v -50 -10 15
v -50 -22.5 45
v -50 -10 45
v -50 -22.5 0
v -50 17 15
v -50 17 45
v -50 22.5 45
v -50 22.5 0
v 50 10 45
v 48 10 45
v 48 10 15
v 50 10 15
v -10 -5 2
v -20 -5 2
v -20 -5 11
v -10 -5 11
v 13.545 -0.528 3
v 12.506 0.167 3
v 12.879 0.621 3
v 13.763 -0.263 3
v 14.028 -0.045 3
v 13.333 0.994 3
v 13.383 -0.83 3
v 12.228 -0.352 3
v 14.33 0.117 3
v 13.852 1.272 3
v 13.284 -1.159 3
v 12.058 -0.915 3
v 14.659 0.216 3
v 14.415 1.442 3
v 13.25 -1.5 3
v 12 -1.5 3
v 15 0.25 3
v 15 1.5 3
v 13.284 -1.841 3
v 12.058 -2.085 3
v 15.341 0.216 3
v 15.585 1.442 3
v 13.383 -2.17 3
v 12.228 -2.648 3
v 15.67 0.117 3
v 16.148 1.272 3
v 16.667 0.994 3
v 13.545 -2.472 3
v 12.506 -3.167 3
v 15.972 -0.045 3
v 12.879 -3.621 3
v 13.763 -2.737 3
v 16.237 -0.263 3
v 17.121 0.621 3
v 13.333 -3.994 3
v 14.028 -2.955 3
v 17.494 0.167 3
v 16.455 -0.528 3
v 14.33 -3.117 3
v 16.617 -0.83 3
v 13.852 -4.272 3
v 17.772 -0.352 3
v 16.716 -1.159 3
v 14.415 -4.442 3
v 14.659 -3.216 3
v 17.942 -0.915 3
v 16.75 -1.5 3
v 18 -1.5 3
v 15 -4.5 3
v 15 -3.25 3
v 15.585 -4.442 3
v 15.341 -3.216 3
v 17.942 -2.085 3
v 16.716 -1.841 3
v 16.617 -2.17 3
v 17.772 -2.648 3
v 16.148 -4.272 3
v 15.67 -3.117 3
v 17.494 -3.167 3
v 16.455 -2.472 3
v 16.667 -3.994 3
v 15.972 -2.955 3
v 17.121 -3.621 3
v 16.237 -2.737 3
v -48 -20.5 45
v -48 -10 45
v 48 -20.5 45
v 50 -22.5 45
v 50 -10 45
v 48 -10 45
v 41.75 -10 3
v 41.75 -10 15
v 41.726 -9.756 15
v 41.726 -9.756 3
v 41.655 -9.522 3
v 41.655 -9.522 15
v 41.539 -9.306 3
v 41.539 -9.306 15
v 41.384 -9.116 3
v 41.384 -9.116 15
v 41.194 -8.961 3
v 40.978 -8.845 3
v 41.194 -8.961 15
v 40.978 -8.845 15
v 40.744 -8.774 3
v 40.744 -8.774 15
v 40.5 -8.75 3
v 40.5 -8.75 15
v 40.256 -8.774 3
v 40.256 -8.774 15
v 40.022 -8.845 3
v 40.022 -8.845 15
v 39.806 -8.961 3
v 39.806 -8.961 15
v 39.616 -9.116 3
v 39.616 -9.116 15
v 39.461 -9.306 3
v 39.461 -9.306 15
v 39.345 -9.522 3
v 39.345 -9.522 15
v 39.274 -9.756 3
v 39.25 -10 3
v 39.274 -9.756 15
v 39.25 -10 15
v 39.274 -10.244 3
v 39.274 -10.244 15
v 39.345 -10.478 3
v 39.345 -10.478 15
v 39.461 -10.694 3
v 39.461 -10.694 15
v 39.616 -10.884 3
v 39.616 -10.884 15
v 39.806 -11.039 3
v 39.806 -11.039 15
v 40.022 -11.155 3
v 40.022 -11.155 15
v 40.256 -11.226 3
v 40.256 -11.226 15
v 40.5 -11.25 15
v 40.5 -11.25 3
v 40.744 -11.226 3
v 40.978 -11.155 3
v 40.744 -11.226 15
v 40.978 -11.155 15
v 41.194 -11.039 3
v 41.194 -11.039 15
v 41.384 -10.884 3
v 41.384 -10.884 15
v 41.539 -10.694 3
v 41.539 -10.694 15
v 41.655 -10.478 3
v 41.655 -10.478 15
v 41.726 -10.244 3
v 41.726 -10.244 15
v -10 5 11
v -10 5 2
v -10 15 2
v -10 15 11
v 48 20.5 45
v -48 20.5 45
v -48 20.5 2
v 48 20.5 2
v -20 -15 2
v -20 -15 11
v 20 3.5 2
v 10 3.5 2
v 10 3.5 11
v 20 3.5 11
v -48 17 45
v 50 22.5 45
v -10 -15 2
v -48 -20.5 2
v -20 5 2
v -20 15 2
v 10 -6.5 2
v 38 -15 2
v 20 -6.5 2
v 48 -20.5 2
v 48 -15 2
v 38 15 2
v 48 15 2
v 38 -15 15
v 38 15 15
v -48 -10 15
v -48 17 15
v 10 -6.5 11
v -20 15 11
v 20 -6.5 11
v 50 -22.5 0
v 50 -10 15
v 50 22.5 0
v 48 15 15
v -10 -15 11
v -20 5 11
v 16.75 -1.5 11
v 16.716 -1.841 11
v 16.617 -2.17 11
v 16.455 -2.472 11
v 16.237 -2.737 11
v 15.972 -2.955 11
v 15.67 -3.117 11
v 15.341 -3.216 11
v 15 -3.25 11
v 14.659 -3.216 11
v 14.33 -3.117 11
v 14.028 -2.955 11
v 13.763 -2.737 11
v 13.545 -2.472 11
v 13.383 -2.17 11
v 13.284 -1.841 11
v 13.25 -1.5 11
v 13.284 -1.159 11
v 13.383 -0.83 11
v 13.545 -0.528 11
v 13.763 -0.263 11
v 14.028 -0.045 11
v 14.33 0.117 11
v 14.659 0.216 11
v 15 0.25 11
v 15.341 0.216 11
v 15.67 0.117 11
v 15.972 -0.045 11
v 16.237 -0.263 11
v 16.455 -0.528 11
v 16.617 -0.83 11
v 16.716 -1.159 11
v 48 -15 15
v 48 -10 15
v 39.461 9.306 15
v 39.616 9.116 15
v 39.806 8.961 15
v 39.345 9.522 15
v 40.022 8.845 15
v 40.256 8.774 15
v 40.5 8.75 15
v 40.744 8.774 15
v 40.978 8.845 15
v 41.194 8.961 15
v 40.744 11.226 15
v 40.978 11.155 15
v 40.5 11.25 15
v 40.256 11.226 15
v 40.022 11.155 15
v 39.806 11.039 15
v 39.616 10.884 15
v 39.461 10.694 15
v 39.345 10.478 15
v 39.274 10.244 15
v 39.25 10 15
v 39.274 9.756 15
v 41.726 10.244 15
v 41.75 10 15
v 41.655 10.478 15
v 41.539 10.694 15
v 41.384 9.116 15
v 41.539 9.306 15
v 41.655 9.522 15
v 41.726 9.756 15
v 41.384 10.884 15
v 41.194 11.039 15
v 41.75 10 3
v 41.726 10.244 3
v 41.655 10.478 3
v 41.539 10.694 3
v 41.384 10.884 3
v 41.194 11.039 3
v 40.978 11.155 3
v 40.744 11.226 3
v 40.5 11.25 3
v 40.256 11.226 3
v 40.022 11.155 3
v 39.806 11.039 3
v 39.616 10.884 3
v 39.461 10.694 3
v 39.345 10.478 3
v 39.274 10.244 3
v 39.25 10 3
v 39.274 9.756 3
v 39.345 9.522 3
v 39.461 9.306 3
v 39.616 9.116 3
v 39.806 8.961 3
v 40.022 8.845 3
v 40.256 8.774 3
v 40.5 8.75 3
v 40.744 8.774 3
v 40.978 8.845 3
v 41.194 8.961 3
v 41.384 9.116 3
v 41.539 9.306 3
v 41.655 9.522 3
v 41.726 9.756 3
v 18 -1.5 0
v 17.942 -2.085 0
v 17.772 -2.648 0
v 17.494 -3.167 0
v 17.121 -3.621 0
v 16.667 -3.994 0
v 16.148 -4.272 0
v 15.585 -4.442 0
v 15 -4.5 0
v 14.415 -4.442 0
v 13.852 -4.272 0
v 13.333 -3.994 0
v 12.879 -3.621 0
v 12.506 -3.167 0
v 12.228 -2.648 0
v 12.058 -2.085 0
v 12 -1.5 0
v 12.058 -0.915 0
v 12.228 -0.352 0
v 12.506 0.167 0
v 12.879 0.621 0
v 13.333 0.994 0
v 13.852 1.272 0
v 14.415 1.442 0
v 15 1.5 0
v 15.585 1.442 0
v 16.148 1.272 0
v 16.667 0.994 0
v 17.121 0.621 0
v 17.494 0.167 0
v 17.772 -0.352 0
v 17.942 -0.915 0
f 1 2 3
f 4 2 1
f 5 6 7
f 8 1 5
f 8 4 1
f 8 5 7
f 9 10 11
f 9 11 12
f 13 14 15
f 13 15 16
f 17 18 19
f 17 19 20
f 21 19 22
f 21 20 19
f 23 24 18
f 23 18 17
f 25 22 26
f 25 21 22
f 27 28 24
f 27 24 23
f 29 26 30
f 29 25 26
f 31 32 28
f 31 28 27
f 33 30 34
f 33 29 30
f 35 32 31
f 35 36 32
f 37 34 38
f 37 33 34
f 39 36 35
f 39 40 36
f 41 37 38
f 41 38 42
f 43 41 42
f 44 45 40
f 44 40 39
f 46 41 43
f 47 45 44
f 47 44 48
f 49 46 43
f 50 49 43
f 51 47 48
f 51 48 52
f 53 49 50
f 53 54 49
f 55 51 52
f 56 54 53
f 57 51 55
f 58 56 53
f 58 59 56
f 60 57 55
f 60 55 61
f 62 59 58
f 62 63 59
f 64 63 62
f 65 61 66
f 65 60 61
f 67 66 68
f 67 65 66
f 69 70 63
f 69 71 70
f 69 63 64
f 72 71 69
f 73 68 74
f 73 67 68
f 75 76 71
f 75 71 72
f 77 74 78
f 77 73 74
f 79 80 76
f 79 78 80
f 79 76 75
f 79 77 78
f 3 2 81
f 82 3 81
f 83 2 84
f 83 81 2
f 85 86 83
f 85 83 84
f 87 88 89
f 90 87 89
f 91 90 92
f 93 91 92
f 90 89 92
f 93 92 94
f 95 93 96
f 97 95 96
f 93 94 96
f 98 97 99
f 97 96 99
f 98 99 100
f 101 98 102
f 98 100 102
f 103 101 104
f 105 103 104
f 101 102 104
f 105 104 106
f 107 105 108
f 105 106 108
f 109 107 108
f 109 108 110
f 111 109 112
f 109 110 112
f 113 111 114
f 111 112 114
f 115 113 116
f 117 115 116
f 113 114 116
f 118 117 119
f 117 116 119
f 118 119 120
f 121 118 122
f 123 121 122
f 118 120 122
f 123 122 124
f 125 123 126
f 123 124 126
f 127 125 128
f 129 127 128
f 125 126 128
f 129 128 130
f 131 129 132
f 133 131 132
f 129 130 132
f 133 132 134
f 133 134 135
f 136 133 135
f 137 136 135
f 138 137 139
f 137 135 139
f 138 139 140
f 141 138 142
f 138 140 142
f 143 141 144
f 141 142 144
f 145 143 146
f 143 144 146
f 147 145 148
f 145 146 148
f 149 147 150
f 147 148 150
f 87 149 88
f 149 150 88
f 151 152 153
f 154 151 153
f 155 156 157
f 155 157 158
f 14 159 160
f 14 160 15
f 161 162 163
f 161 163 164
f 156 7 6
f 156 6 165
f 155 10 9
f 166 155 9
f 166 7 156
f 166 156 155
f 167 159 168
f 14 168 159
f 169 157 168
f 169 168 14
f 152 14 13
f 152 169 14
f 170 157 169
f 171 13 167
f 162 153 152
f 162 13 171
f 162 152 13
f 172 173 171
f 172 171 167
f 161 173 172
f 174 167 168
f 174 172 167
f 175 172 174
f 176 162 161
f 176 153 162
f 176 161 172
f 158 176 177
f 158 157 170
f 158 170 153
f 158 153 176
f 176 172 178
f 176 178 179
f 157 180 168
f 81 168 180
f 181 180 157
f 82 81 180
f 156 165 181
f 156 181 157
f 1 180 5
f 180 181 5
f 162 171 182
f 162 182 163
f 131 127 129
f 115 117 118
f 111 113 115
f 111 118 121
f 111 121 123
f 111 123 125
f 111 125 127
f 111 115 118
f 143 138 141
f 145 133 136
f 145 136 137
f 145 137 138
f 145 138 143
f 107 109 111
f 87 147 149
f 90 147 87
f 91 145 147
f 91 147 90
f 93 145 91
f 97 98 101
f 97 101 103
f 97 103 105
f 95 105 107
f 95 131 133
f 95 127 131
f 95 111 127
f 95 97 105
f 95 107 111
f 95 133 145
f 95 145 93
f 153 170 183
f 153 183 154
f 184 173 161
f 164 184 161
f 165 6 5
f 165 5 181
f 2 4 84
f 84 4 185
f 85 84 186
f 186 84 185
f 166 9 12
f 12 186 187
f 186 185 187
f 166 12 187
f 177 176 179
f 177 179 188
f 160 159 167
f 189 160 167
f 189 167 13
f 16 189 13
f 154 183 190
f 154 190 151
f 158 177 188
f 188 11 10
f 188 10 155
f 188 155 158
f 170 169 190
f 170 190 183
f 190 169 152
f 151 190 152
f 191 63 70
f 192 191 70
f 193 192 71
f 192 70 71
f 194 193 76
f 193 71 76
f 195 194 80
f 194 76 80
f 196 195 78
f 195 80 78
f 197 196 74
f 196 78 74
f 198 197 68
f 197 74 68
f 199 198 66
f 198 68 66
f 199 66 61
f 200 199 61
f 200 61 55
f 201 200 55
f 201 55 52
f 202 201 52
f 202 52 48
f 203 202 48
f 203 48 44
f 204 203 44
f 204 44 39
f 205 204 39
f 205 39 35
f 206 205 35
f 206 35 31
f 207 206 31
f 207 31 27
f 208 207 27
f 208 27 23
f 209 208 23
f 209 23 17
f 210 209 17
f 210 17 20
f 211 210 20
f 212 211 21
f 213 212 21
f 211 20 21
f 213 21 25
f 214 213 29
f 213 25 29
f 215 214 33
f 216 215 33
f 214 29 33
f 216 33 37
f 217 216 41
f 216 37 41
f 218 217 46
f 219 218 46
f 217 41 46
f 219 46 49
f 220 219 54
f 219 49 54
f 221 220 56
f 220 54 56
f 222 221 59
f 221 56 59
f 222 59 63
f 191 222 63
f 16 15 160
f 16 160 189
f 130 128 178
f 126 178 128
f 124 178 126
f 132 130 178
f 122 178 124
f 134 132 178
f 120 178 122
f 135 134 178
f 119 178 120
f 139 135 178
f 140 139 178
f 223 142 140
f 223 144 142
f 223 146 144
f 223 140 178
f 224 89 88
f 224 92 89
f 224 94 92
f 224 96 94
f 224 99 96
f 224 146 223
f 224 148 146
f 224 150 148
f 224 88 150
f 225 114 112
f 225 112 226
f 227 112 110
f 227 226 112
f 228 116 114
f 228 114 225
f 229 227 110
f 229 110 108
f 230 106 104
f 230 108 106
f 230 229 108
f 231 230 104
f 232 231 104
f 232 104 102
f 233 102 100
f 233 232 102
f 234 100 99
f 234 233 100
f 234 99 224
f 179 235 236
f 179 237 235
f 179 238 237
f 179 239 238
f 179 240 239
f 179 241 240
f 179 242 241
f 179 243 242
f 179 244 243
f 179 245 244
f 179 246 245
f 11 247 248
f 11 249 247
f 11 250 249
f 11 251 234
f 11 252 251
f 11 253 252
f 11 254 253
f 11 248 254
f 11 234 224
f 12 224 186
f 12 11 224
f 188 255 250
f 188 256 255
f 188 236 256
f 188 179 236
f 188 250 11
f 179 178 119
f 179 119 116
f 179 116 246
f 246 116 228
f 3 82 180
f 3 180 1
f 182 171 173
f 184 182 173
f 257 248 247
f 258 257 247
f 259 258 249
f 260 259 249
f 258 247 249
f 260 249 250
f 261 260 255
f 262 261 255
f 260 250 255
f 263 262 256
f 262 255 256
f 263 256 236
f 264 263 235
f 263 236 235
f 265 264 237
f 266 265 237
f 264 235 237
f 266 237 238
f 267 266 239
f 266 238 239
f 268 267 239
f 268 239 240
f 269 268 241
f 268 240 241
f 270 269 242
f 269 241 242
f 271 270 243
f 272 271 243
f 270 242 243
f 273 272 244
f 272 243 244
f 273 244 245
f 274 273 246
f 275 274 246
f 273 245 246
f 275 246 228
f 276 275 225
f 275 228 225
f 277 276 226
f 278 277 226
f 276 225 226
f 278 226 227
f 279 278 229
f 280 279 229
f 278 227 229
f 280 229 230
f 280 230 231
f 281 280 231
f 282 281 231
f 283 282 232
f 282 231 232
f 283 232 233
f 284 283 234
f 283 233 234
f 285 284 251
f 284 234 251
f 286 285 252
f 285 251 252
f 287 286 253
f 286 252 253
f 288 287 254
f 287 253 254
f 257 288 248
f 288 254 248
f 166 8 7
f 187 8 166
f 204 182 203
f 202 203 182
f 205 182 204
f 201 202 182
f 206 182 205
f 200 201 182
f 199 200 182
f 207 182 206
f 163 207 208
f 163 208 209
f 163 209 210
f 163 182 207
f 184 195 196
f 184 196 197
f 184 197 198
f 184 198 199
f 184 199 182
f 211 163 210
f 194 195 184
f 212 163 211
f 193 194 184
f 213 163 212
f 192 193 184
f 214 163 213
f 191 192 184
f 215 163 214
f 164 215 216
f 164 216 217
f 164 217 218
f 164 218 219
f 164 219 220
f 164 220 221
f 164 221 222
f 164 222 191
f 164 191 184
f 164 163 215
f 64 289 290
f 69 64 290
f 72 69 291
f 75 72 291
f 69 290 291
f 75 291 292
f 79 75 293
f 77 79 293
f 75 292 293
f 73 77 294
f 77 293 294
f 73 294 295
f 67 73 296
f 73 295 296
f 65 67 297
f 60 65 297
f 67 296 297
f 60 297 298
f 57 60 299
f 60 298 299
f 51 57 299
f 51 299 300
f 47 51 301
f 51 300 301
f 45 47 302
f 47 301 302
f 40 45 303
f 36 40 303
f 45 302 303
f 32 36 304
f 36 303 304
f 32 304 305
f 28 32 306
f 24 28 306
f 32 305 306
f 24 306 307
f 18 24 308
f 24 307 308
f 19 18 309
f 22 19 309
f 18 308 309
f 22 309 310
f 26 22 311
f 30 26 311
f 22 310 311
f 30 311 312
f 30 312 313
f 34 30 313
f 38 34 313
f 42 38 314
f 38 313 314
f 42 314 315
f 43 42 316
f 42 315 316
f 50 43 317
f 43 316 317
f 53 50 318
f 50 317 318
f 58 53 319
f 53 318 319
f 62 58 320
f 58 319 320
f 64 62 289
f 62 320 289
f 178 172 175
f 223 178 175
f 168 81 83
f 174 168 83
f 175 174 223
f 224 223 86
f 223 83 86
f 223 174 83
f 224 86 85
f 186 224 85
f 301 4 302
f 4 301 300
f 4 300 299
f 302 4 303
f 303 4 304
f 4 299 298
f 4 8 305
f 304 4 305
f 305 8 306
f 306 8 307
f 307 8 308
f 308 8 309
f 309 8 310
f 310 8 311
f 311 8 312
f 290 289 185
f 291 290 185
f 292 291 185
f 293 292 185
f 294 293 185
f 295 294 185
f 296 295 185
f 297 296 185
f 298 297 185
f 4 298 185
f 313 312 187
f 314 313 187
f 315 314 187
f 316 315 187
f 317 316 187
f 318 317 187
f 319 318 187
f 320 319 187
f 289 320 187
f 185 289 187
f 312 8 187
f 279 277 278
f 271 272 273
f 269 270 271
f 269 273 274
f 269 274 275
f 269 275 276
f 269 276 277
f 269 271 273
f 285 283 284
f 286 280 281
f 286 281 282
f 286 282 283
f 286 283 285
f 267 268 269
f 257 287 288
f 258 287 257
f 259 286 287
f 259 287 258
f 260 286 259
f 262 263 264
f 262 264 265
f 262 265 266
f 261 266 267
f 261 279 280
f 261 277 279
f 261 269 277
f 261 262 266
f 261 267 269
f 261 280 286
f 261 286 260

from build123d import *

# Parameters (mm, degrees)
SKETCH_W        = 100
SKETCH_H        = 45
PAD_DEPTH       = 45
SKETCH001_W     = 96
SKETCH001_H     = 41
POCKET_DEPTH    = 43
SKETCH002_W     = 10
SKETCH002_H     = 10
PAD001_DEPTH    = 9
SKETCH003_R     = 3
POCKET001_DEPTH = 3
SKETCH004_R     = 1.75
POCKET002_DEPTH = 42.001
SKETCH005_W     = 2
SKETCH005_H     = 20
POCKET003_DEPTH = 30
SKETCH006_W     = 10
SKETCH006_H     = 30
PAD002_DEPTH    = 13
SKETCH007_R     = 1.25
POCKET004_DEPTH = 12
SKETCH008_W     = 2
SKETCH008_H     = 7
POCKET005_DEPTH = 30


with BuildPart() as part:
    # Sketch → Pad (new body)
    with BuildSketch(Plane.XY):
        Rectangle(SKETCH_W, SKETCH_H)
    extrude(amount=PAD_DEPTH)

    # Sketch001 (on Face6 of Pad) → Pocket (cut)
    with BuildSketch(Plane.XY.offset(45)):
        Rectangle(SKETCH001_W, SKETCH001_H)
    extrude(amount=-POCKET_DEPTH, mode=Mode.SUBTRACT)

    # Sketch002 (on Face11 of Pocket) → Pad001 (join)
    with BuildSketch(Plane.XY.offset(2)):
        with Locations((15, -1.5)):
            Rectangle(SKETCH002_W, SKETCH002_H)
        with Locations((-15, 10)):
            Rectangle(SKETCH002_W, SKETCH002_H)
        with Locations((-15, -10)):
            Rectangle(SKETCH002_W, SKETCH002_H)
    extrude(amount=PAD001_DEPTH)

    # Sketch003 (on Face4 of Pad001) → Pocket001 (cut)
    with BuildSketch(Plane(origin=(0, 0, 0), x_dir=(1, 0, 0), z_dir=(0, 0, -1))):
        with Locations((15, 1.5)):
            Circle(SKETCH003_R)
    extrude(amount=-POCKET001_DEPTH, mode=Mode.SUBTRACT)

    # Sketch004 (on Face12 of Pocket001) → Pocket002 (cut, through all)
    with BuildSketch(Plane(origin=(0, 0, 3), x_dir=(1, 0, 0), z_dir=(0, 0, -1))):
        with Locations((15, 1.5)):
            Circle(SKETCH004_R)
    extrude(amount=-POCKET002_DEPTH, mode=Mode.SUBTRACT)

    # Sketch005 (on Face5 of Pocket002) → Pocket003 (cut)
    with BuildSketch(Plane.XY.offset(45)):
        with Locations((49, 0)):
            Rectangle(SKETCH005_W, SKETCH005_H)
    pocket003 = extrude(amount=-POCKET003_DEPTH, mode=Mode.SUBTRACT)

    # Mirrored: Pocket003 across YZ
    add(pocket003.mirror(Plane.YZ), mode=Mode.SUBTRACT)

    # Sketch006 (on Face20 of Mirrored) → Pad002 (join)
    with BuildSketch(Plane.XY.offset(2)):
        with Locations((43, 0)):
            Rectangle(SKETCH006_W, SKETCH006_H)
    extrude(amount=PAD002_DEPTH)

    # Sketch007 (on Face20 of Pad002) → Pocket004 (cut)
    with BuildSketch(Plane.XY.offset(15)):
        with Locations((40.5, 10)):
            Circle(SKETCH007_R)
        with Locations((40.5, -10)):
            Circle(SKETCH007_R)
    extrude(amount=-POCKET004_DEPTH, mode=Mode.SUBTRACT)

    # Sketch008 (on Face9 of Pocket004) → Pocket005 (cut)
    with BuildSketch(Plane.XY.offset(45)):
        with Locations((-49, 13.5)):
            Rectangle(SKETCH008_W, SKETCH008_H)
    extrude(amount=-POCKET005_DEPTH, mode=Mode.SUBTRACT)


solid = part.part
